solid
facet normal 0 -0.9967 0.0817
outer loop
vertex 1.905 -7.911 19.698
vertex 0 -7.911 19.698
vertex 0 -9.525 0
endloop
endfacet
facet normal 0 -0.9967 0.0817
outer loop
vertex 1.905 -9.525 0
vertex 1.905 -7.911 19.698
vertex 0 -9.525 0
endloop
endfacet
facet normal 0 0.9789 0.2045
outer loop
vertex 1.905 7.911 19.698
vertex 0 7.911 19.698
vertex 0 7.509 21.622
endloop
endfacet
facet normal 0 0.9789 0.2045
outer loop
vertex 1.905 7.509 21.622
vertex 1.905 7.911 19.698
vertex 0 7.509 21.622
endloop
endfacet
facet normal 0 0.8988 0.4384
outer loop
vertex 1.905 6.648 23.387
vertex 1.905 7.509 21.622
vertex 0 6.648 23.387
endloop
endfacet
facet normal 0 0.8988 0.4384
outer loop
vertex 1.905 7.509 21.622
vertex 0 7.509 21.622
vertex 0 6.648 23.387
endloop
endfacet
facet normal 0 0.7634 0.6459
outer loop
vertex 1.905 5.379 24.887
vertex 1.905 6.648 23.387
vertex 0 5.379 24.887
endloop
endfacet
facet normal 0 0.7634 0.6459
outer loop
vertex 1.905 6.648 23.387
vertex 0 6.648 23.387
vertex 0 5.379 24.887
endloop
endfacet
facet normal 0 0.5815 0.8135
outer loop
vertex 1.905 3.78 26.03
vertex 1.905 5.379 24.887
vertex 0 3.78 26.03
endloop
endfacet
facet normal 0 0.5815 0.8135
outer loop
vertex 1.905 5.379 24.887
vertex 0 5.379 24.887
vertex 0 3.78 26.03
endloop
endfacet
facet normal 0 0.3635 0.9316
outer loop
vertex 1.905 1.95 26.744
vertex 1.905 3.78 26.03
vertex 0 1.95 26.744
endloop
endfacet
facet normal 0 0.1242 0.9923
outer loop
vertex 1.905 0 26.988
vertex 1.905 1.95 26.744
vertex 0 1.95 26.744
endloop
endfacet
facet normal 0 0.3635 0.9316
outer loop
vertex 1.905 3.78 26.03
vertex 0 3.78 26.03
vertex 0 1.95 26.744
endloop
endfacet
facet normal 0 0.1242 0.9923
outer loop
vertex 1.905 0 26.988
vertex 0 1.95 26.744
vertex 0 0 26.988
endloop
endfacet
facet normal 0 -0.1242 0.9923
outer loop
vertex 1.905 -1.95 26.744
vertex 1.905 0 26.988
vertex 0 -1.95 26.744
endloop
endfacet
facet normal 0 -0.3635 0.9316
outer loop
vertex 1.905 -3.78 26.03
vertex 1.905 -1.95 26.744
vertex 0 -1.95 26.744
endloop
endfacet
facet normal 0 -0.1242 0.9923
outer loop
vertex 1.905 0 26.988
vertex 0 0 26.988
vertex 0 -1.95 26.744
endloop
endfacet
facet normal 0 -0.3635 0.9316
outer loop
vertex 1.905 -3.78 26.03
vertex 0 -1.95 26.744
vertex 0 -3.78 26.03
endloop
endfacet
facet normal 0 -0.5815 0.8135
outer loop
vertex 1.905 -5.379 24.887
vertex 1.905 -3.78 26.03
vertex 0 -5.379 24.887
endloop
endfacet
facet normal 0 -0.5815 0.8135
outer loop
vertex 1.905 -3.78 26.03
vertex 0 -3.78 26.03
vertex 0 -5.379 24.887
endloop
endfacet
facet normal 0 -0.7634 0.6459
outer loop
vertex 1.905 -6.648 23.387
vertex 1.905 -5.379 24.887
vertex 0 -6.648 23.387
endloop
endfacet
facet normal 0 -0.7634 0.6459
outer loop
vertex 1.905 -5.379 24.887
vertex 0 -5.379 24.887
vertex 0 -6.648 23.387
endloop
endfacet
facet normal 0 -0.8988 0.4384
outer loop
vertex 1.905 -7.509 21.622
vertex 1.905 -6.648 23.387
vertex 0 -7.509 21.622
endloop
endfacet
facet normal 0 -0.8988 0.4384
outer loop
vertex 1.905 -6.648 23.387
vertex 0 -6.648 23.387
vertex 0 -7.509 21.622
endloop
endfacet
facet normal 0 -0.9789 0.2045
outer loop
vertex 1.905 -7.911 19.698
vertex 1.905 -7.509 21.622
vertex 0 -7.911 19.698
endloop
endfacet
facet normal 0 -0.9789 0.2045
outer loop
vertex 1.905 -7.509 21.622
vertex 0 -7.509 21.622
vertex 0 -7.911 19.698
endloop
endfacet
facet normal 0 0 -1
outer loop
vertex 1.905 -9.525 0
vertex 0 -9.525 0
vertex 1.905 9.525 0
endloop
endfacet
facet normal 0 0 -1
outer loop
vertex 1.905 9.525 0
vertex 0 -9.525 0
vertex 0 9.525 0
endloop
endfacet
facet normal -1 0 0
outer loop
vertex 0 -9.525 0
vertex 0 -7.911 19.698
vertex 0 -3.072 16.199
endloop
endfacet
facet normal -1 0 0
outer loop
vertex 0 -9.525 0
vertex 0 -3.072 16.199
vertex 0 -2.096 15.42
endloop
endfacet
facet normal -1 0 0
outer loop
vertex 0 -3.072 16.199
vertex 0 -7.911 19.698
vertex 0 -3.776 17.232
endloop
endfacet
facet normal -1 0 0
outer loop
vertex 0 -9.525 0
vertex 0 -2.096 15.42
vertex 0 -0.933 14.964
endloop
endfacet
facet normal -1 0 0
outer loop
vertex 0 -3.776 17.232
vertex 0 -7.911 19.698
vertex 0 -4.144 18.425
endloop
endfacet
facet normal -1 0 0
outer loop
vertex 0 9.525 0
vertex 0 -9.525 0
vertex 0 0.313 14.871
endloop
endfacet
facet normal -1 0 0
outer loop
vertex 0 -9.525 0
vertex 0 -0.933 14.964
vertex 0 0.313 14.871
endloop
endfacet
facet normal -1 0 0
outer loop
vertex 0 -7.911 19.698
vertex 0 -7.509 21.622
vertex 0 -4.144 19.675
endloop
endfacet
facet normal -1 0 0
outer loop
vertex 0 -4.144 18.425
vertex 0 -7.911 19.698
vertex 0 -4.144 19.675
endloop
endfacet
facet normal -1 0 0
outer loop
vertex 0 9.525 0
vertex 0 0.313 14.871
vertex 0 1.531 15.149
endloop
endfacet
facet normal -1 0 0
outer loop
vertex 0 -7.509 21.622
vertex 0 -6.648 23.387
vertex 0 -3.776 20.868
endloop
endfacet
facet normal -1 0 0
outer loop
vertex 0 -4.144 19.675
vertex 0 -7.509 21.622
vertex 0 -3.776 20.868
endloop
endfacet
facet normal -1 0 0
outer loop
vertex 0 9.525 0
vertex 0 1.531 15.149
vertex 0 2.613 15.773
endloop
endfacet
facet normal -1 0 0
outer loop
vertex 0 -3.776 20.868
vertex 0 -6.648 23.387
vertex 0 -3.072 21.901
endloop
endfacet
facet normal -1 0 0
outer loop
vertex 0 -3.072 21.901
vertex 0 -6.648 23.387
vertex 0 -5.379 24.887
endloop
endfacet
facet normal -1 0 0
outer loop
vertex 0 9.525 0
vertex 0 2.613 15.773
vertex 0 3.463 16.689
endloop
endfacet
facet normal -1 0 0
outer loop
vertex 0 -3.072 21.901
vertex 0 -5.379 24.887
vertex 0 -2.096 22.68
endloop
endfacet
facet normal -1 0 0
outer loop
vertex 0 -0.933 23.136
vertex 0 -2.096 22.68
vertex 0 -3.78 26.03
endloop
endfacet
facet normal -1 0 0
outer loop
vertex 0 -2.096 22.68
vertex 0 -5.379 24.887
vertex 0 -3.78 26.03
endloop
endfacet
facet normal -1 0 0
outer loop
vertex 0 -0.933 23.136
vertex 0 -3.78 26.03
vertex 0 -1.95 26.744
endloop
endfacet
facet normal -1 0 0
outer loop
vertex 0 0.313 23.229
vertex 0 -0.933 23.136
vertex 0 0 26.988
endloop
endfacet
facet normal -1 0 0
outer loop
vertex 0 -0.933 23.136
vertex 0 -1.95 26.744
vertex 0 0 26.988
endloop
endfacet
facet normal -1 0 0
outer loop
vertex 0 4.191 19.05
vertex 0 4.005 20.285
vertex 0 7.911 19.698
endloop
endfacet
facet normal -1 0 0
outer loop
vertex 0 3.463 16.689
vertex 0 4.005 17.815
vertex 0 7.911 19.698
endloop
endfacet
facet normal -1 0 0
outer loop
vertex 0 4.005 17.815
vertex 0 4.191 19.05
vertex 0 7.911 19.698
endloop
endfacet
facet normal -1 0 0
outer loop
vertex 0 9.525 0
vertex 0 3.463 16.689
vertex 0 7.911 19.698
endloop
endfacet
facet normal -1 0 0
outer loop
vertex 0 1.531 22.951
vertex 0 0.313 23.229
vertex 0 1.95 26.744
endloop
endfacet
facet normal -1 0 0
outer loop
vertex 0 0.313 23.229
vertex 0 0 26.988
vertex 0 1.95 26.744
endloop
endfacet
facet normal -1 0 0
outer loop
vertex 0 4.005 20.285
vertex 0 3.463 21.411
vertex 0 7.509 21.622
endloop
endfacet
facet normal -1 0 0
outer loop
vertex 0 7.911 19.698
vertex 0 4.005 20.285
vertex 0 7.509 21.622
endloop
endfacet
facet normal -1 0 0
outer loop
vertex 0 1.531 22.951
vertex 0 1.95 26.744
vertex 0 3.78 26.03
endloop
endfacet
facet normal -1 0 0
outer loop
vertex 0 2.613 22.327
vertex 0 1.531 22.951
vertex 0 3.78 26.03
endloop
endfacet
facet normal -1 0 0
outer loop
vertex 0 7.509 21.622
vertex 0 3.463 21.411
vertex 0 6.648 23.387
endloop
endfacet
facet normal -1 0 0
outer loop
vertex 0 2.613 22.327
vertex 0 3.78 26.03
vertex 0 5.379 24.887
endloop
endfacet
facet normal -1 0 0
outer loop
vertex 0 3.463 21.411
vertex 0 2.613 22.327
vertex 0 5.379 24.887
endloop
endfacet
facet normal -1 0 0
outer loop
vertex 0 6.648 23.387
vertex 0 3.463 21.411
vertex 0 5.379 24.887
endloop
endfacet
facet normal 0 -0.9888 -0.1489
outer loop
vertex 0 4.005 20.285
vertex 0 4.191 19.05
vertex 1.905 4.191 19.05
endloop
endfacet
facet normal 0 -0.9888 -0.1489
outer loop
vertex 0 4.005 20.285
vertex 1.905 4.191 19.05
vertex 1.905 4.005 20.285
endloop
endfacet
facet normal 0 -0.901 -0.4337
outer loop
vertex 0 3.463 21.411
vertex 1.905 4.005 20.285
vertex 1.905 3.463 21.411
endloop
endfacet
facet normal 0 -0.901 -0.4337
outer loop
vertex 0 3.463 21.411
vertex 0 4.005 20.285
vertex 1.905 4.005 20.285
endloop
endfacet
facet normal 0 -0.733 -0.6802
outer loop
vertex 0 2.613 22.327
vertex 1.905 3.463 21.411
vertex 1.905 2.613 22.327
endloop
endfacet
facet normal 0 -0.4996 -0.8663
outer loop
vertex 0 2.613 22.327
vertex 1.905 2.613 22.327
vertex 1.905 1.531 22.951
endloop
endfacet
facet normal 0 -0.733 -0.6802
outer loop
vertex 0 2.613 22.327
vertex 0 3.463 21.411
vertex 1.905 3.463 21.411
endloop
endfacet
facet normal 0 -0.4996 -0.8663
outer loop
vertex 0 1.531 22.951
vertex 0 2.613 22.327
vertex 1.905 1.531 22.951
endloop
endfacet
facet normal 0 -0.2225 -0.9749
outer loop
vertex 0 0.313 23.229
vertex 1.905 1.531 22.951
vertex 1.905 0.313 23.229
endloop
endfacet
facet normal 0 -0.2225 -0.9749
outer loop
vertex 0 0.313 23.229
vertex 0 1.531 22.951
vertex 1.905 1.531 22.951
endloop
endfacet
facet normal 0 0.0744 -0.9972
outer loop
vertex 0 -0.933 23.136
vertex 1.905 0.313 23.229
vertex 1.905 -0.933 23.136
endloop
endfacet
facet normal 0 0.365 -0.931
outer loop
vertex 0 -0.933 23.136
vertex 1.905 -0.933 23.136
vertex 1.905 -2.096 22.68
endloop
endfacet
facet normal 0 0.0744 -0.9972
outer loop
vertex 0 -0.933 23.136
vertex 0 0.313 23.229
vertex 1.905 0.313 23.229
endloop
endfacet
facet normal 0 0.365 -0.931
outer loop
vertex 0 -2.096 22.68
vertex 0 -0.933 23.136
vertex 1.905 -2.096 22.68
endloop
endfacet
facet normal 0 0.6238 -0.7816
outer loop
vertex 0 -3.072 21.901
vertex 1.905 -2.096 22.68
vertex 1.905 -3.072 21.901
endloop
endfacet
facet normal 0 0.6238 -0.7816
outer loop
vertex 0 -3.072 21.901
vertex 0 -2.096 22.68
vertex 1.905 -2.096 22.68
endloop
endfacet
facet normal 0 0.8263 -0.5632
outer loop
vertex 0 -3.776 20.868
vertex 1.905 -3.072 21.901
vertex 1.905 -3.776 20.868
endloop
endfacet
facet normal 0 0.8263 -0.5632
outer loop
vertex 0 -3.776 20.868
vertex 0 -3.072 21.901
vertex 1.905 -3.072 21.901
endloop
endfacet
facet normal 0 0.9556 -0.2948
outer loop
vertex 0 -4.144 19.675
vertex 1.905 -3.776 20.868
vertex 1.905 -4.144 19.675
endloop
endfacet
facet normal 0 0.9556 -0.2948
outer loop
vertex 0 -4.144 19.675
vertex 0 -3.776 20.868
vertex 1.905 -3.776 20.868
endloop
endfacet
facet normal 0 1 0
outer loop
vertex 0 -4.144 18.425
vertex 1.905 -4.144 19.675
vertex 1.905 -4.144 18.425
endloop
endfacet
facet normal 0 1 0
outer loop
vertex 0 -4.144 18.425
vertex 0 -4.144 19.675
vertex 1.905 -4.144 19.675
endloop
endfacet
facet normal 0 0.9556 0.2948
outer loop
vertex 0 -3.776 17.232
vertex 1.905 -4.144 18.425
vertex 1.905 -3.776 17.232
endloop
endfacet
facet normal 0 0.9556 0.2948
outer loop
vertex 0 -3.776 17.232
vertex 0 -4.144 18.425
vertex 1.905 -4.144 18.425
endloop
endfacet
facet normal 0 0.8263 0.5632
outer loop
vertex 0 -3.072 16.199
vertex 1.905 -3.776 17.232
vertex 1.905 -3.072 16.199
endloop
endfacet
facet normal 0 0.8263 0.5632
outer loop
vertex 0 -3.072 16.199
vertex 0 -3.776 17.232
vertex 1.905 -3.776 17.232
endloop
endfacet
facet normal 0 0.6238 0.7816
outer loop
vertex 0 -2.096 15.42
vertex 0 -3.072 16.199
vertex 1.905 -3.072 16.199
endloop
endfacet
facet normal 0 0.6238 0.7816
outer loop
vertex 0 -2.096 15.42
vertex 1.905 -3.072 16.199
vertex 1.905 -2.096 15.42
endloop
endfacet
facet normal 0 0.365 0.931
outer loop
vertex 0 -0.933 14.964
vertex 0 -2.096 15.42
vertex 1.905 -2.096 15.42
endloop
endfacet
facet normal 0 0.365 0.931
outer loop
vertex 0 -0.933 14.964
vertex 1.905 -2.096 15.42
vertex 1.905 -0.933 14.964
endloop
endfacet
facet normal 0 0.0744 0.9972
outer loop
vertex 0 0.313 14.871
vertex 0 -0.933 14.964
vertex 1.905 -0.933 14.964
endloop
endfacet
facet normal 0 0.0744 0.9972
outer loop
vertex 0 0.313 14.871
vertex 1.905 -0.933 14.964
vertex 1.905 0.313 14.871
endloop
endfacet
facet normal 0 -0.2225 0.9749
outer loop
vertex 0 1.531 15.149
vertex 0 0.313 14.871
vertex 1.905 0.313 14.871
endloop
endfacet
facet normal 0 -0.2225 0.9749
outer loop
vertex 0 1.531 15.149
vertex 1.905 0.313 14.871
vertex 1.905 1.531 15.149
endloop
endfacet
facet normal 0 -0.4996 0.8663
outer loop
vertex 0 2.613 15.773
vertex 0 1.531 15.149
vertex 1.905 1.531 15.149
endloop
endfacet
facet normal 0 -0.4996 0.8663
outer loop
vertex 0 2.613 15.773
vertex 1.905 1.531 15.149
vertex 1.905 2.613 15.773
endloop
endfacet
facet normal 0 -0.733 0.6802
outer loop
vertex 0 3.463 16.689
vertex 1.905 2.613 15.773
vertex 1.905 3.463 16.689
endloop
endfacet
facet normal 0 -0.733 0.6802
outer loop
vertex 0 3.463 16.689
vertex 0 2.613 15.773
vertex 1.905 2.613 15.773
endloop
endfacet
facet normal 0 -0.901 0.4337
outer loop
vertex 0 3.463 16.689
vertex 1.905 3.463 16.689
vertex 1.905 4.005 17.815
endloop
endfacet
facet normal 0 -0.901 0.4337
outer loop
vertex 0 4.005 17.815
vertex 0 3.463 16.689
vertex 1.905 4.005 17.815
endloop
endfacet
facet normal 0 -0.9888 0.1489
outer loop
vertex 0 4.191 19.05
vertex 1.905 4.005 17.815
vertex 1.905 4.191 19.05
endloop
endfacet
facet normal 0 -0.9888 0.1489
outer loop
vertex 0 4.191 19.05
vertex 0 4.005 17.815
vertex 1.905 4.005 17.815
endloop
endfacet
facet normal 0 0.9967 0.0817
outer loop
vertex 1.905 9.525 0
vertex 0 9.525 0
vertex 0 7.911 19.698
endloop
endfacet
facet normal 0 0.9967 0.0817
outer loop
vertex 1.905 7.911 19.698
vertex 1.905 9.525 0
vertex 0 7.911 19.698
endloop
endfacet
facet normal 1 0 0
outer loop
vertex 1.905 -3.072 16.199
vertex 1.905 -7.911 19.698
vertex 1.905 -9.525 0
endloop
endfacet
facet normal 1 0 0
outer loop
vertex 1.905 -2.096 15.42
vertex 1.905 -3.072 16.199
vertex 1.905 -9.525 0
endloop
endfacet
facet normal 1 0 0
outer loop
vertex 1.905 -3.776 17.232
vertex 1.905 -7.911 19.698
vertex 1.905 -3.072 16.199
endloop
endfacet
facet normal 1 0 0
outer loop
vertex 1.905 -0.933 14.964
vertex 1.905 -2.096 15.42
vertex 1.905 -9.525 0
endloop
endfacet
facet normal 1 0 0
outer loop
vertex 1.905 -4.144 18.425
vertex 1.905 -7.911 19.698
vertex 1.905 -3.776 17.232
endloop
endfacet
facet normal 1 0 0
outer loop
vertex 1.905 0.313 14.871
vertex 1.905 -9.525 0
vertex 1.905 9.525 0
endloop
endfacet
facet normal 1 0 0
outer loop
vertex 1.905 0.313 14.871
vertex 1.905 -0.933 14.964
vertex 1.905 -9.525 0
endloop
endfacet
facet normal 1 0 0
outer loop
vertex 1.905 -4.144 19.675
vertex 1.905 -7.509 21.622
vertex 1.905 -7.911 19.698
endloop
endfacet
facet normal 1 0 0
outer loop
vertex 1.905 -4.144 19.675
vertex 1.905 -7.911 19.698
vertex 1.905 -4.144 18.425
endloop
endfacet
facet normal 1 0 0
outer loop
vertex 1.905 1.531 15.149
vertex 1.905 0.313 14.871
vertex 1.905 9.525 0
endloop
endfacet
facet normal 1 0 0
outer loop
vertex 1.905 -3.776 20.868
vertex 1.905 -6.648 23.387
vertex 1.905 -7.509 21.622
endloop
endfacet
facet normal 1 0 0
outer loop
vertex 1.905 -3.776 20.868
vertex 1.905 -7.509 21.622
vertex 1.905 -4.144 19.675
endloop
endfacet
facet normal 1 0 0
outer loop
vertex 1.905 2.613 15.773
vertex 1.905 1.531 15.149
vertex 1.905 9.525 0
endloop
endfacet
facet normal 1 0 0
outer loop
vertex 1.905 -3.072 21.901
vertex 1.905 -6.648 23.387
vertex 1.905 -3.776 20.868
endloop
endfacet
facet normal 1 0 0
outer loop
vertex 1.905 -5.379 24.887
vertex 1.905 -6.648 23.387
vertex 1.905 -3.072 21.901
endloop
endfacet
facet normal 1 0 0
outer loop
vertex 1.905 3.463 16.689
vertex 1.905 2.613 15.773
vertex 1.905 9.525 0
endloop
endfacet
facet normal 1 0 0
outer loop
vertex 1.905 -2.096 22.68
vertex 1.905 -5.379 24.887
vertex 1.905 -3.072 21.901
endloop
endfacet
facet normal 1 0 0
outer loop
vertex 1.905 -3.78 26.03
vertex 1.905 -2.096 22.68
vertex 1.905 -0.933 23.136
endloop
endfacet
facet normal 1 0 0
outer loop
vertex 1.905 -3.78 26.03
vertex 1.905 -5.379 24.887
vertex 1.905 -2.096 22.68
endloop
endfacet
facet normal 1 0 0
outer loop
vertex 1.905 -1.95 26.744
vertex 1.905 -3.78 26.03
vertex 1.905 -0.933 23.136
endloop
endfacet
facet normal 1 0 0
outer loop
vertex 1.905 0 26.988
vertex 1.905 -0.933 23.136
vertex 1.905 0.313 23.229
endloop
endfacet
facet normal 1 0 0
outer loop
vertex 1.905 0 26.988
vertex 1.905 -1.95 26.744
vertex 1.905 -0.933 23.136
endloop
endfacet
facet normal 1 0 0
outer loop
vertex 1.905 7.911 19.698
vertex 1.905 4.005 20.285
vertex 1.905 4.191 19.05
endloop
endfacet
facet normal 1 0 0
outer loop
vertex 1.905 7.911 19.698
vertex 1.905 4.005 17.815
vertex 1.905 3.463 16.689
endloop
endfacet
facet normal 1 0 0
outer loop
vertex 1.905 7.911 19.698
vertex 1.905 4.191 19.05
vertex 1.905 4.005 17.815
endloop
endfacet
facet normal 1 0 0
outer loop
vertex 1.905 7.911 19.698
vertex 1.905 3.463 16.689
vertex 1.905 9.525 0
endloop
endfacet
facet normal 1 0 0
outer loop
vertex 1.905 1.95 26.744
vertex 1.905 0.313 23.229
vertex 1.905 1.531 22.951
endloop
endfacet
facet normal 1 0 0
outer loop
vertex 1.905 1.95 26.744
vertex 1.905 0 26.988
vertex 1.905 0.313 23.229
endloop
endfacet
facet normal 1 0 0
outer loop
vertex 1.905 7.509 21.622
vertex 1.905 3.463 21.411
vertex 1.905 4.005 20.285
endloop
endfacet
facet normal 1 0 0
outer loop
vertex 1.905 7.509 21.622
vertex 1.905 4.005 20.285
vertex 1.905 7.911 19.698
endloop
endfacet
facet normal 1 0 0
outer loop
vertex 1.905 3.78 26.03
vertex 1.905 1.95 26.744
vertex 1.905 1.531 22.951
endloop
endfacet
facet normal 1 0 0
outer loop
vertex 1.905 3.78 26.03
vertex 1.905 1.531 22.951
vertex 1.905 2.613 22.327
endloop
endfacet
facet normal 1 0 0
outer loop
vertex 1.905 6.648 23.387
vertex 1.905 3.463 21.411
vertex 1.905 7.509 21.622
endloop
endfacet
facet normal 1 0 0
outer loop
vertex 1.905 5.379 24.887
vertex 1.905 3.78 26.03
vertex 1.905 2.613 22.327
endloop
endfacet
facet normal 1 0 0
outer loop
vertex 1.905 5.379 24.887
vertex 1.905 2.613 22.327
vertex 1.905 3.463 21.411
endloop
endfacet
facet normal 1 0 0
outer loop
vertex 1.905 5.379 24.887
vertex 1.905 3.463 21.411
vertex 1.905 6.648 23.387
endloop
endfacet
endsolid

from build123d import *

# Parameters (mm, degrees)
F0_R     = 4.191
F1_DEPTH = 1.905


with BuildPart() as f1:
    # F0 (on Right) → F1 (new body)
    with BuildSketch(Plane.YZ):
        with BuildLine():
            Line((9.525, 0), (7.910989, 19.698203))
            ThreePointArc((7.910989, 19.698203), (0, 26.9875), (-7.910989, 19.698203))
            Line((-7.910989, 19.698203), (-9.525, 0))
            Line((-9.525, 0), (9.525, 0))
        make_face()
        with Locations((0, 19.05)):
            Circle(F0_R, mode=Mode.SUBTRACT)
    extrude(amount=F1_DEPTH)


solid = f1.part
